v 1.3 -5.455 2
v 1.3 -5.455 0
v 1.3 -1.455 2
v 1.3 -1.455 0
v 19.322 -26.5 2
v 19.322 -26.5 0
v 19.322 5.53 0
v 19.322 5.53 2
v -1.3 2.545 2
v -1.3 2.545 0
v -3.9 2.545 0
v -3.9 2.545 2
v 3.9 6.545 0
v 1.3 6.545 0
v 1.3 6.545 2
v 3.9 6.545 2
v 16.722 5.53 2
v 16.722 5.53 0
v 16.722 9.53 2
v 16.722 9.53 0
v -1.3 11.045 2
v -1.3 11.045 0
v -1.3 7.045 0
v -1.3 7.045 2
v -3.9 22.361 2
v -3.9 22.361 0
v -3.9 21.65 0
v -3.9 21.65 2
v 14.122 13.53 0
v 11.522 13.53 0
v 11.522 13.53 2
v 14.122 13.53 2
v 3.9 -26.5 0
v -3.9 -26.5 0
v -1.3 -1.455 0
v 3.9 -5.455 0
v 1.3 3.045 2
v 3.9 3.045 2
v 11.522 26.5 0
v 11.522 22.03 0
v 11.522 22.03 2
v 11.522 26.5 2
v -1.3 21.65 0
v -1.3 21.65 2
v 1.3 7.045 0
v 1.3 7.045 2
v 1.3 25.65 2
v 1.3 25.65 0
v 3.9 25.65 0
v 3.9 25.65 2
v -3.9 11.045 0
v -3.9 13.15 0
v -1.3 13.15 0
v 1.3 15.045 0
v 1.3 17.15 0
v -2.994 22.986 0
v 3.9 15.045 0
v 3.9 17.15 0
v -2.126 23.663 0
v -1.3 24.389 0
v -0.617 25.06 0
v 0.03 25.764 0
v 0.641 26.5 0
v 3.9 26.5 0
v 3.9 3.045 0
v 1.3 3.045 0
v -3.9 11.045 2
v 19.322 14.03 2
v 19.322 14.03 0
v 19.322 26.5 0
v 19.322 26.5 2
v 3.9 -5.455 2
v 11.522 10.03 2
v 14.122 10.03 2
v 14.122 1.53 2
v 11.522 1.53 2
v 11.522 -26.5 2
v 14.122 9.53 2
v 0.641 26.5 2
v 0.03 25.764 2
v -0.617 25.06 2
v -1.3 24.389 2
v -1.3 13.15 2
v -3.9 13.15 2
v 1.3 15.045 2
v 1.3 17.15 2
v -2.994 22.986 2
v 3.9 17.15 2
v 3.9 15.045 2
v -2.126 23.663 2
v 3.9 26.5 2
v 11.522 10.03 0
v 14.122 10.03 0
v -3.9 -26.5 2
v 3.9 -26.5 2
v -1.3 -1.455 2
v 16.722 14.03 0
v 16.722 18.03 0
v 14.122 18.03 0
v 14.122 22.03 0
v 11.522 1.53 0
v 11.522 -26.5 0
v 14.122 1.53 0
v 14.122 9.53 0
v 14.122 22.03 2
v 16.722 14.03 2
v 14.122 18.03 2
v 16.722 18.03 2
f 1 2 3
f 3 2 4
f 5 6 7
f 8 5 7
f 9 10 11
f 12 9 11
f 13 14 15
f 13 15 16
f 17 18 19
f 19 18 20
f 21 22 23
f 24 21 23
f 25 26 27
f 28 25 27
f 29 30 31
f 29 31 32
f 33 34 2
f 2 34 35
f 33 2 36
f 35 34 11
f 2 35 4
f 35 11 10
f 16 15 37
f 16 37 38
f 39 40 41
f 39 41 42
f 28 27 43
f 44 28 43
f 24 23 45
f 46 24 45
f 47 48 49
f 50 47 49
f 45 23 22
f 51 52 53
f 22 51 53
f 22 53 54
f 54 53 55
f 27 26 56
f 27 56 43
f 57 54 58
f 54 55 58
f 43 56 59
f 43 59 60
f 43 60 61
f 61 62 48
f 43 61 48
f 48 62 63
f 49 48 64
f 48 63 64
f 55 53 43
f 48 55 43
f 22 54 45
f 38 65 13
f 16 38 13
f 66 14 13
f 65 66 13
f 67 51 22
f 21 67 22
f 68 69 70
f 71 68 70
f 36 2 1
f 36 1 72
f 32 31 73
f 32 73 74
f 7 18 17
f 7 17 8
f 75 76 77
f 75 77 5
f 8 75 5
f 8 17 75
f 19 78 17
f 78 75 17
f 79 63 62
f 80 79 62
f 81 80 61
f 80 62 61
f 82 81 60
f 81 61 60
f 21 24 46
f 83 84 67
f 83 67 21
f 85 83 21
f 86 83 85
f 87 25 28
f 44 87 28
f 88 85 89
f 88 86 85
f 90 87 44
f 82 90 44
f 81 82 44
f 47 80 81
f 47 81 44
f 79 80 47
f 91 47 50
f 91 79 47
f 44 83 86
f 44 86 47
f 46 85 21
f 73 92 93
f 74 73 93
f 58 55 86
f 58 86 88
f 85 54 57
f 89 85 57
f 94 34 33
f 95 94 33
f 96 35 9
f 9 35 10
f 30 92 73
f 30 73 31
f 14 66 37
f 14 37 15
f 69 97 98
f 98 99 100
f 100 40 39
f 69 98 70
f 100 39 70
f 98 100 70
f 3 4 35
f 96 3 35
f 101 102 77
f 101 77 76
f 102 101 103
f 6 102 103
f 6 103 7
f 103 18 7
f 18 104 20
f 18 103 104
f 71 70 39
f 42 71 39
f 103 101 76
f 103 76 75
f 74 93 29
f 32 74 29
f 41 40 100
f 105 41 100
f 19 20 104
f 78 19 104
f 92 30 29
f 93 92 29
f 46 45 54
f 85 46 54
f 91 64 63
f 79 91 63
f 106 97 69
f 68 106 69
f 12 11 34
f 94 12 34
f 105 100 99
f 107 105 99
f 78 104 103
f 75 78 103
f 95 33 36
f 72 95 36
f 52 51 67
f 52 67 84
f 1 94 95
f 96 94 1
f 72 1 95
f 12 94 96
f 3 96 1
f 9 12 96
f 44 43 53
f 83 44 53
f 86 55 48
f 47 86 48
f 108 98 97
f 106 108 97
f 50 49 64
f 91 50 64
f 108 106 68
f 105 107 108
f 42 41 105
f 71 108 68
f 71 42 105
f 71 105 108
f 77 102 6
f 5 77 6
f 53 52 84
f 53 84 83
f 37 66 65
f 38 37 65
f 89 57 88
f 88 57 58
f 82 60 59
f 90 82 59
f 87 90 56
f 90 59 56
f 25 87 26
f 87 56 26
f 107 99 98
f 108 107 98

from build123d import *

# Parameters (mm, degrees)
F0_W     = 2.6
F0_H     = 0.85
F0_H_2   = 2.105
F1_DEPTH = 2
F0_H_3   = 3.5
F0_H_4   = 21.045
F0_H_5   = 4.47
F0_H_6   = 32.03
F0_H_7   = 28.03


with BuildPart() as f1:
    # F0 (on Top) → F1 (new body)
    with BuildSketch(Plane.XY):
        with BuildLine():
            Line((-1.3, 21.65), (-1.3, 24.3894784928))
            ThreePointArc((-1.3, 24.3894784928), (-2.5553083064, 23.3178016678), (-3.9, 22.3606734579))
            Line((-3.9, 22.3606734579), (-3.9, 21.65))
            Line((-3.9, 21.65), (-1.3, 21.65))
        make_face()
        with Locations((2.6, 26.075)):
            Rectangle(F0_W, F0_H)
        with BuildLine():
            Line((1.3, 25.65), (1.3, 26.5))
            Line((1.3, 26.5), (0.6410047179, 26.5))
            ThreePointArc((0.6410047179, 26.5), (-0.2890942171, 25.4075810197), (-1.3, 24.3894784928))
            Line((-1.3, 24.3894784928), (-1.3, 21.65))
            Line((-1.3, 21.65), (-1.3, 13.15))
            Line((-1.3, 13.15), (-1.3, 11.045))
            Line((-1.3, 11.045), (-1.3, 7.045))
            Line((-1.3, 7.045), (1.3, 7.045))
            Line((1.3, 7.045), (1.3, 15.045))
            Line((1.3, 15.045), (1.3, 17.15))
            Line((1.3, 17.15), (1.3, 25.65))
        make_face()
        with Locations((2.6, 16.0975)):
            Rectangle(F0_W, F0_H_2)
        with Locations((-2.6, 12.0975)):
            Rectangle(F0_W, F0_H_2)
    extrude(amount=F1_DEPTH)


with BuildPart() as f1b:
    # F0 (on Top) → F1, piece 2 (new body)
    with BuildSketch(Plane.XY):
        with Locations((2.6, 4.795)):
            Rectangle(F0_W, F0_H_3)
    extrude(amount=F1_DEPTH)


with BuildPart() as f1c:
    # F0 (on Top) → F1, piece 3 (new body)
    with BuildSketch(Plane.XY):
        Polygon((-1.3, -1.455), (-1.3, 2.545), (-3.9, 2.545), (-3.9, -26.5), (-1.3, -26.5), align=None)
        Polygon((1.3, -26.5), (1.3, -5.455), (1.3, -1.455), (-1.3, -1.455), (-1.3, -26.5), align=None)
        with Locations((2.6, -15.9775)):
            Rectangle(F0_W, F0_H_4)
    extrude(amount=F1_DEPTH)


with BuildPart() as f1d:
    # F0 (on Top) → F1, piece 4 (new body)
    with BuildSketch(Plane.XY):
        with Locations((12.8221682936, 24.265)):
            Rectangle(F0_W, F0_H_5)
        Polygon((14.1221682936, 26.5), (14.1221682936, 22.03), (14.1221682936, 18.03), (16.7221682936, 18.03), (16.7221682936, 26.5), align=None)
        Polygon((16.7221682936, 14.03), (19.3221682936, 14.03), (19.3221682936, 26.5), (16.7221682936, 26.5), (16.7221682936, 18.03), align=None)
    extrude(amount=F1_DEPTH)


with BuildPart() as f1e:
    # F0 (on Top) → F1, piece 5 (new body)
    with BuildSketch(Plane.XY):
        with Locations((12.8221682936, 11.78)):
            Rectangle(F0_W, F0_H_3)
    extrude(amount=F1_DEPTH)


with BuildPart() as f1f:
    # F0 (on Top) → F1, piece 6 (new body)
    with BuildSketch(Plane.XY):
        Polygon((14.1221682936, 1.53), (14.1221682936, -26.5), (16.7221682936, -26.5), (16.7221682936, 5.53), (16.7221682936, 9.53), (14.1221682936, 9.53), align=None)
        with Locations((18.0221682936, -10.485)):
            Rectangle(F0_W, F0_H_6)
        with Locations((12.8221682936, -12.485)):
            Rectangle(F0_W, F0_H_7)
    extrude(amount=F1_DEPTH)


solid = Compound([f1.part, f1b.part, f1c.part, f1d.part, f1e.part, f1f.part])
